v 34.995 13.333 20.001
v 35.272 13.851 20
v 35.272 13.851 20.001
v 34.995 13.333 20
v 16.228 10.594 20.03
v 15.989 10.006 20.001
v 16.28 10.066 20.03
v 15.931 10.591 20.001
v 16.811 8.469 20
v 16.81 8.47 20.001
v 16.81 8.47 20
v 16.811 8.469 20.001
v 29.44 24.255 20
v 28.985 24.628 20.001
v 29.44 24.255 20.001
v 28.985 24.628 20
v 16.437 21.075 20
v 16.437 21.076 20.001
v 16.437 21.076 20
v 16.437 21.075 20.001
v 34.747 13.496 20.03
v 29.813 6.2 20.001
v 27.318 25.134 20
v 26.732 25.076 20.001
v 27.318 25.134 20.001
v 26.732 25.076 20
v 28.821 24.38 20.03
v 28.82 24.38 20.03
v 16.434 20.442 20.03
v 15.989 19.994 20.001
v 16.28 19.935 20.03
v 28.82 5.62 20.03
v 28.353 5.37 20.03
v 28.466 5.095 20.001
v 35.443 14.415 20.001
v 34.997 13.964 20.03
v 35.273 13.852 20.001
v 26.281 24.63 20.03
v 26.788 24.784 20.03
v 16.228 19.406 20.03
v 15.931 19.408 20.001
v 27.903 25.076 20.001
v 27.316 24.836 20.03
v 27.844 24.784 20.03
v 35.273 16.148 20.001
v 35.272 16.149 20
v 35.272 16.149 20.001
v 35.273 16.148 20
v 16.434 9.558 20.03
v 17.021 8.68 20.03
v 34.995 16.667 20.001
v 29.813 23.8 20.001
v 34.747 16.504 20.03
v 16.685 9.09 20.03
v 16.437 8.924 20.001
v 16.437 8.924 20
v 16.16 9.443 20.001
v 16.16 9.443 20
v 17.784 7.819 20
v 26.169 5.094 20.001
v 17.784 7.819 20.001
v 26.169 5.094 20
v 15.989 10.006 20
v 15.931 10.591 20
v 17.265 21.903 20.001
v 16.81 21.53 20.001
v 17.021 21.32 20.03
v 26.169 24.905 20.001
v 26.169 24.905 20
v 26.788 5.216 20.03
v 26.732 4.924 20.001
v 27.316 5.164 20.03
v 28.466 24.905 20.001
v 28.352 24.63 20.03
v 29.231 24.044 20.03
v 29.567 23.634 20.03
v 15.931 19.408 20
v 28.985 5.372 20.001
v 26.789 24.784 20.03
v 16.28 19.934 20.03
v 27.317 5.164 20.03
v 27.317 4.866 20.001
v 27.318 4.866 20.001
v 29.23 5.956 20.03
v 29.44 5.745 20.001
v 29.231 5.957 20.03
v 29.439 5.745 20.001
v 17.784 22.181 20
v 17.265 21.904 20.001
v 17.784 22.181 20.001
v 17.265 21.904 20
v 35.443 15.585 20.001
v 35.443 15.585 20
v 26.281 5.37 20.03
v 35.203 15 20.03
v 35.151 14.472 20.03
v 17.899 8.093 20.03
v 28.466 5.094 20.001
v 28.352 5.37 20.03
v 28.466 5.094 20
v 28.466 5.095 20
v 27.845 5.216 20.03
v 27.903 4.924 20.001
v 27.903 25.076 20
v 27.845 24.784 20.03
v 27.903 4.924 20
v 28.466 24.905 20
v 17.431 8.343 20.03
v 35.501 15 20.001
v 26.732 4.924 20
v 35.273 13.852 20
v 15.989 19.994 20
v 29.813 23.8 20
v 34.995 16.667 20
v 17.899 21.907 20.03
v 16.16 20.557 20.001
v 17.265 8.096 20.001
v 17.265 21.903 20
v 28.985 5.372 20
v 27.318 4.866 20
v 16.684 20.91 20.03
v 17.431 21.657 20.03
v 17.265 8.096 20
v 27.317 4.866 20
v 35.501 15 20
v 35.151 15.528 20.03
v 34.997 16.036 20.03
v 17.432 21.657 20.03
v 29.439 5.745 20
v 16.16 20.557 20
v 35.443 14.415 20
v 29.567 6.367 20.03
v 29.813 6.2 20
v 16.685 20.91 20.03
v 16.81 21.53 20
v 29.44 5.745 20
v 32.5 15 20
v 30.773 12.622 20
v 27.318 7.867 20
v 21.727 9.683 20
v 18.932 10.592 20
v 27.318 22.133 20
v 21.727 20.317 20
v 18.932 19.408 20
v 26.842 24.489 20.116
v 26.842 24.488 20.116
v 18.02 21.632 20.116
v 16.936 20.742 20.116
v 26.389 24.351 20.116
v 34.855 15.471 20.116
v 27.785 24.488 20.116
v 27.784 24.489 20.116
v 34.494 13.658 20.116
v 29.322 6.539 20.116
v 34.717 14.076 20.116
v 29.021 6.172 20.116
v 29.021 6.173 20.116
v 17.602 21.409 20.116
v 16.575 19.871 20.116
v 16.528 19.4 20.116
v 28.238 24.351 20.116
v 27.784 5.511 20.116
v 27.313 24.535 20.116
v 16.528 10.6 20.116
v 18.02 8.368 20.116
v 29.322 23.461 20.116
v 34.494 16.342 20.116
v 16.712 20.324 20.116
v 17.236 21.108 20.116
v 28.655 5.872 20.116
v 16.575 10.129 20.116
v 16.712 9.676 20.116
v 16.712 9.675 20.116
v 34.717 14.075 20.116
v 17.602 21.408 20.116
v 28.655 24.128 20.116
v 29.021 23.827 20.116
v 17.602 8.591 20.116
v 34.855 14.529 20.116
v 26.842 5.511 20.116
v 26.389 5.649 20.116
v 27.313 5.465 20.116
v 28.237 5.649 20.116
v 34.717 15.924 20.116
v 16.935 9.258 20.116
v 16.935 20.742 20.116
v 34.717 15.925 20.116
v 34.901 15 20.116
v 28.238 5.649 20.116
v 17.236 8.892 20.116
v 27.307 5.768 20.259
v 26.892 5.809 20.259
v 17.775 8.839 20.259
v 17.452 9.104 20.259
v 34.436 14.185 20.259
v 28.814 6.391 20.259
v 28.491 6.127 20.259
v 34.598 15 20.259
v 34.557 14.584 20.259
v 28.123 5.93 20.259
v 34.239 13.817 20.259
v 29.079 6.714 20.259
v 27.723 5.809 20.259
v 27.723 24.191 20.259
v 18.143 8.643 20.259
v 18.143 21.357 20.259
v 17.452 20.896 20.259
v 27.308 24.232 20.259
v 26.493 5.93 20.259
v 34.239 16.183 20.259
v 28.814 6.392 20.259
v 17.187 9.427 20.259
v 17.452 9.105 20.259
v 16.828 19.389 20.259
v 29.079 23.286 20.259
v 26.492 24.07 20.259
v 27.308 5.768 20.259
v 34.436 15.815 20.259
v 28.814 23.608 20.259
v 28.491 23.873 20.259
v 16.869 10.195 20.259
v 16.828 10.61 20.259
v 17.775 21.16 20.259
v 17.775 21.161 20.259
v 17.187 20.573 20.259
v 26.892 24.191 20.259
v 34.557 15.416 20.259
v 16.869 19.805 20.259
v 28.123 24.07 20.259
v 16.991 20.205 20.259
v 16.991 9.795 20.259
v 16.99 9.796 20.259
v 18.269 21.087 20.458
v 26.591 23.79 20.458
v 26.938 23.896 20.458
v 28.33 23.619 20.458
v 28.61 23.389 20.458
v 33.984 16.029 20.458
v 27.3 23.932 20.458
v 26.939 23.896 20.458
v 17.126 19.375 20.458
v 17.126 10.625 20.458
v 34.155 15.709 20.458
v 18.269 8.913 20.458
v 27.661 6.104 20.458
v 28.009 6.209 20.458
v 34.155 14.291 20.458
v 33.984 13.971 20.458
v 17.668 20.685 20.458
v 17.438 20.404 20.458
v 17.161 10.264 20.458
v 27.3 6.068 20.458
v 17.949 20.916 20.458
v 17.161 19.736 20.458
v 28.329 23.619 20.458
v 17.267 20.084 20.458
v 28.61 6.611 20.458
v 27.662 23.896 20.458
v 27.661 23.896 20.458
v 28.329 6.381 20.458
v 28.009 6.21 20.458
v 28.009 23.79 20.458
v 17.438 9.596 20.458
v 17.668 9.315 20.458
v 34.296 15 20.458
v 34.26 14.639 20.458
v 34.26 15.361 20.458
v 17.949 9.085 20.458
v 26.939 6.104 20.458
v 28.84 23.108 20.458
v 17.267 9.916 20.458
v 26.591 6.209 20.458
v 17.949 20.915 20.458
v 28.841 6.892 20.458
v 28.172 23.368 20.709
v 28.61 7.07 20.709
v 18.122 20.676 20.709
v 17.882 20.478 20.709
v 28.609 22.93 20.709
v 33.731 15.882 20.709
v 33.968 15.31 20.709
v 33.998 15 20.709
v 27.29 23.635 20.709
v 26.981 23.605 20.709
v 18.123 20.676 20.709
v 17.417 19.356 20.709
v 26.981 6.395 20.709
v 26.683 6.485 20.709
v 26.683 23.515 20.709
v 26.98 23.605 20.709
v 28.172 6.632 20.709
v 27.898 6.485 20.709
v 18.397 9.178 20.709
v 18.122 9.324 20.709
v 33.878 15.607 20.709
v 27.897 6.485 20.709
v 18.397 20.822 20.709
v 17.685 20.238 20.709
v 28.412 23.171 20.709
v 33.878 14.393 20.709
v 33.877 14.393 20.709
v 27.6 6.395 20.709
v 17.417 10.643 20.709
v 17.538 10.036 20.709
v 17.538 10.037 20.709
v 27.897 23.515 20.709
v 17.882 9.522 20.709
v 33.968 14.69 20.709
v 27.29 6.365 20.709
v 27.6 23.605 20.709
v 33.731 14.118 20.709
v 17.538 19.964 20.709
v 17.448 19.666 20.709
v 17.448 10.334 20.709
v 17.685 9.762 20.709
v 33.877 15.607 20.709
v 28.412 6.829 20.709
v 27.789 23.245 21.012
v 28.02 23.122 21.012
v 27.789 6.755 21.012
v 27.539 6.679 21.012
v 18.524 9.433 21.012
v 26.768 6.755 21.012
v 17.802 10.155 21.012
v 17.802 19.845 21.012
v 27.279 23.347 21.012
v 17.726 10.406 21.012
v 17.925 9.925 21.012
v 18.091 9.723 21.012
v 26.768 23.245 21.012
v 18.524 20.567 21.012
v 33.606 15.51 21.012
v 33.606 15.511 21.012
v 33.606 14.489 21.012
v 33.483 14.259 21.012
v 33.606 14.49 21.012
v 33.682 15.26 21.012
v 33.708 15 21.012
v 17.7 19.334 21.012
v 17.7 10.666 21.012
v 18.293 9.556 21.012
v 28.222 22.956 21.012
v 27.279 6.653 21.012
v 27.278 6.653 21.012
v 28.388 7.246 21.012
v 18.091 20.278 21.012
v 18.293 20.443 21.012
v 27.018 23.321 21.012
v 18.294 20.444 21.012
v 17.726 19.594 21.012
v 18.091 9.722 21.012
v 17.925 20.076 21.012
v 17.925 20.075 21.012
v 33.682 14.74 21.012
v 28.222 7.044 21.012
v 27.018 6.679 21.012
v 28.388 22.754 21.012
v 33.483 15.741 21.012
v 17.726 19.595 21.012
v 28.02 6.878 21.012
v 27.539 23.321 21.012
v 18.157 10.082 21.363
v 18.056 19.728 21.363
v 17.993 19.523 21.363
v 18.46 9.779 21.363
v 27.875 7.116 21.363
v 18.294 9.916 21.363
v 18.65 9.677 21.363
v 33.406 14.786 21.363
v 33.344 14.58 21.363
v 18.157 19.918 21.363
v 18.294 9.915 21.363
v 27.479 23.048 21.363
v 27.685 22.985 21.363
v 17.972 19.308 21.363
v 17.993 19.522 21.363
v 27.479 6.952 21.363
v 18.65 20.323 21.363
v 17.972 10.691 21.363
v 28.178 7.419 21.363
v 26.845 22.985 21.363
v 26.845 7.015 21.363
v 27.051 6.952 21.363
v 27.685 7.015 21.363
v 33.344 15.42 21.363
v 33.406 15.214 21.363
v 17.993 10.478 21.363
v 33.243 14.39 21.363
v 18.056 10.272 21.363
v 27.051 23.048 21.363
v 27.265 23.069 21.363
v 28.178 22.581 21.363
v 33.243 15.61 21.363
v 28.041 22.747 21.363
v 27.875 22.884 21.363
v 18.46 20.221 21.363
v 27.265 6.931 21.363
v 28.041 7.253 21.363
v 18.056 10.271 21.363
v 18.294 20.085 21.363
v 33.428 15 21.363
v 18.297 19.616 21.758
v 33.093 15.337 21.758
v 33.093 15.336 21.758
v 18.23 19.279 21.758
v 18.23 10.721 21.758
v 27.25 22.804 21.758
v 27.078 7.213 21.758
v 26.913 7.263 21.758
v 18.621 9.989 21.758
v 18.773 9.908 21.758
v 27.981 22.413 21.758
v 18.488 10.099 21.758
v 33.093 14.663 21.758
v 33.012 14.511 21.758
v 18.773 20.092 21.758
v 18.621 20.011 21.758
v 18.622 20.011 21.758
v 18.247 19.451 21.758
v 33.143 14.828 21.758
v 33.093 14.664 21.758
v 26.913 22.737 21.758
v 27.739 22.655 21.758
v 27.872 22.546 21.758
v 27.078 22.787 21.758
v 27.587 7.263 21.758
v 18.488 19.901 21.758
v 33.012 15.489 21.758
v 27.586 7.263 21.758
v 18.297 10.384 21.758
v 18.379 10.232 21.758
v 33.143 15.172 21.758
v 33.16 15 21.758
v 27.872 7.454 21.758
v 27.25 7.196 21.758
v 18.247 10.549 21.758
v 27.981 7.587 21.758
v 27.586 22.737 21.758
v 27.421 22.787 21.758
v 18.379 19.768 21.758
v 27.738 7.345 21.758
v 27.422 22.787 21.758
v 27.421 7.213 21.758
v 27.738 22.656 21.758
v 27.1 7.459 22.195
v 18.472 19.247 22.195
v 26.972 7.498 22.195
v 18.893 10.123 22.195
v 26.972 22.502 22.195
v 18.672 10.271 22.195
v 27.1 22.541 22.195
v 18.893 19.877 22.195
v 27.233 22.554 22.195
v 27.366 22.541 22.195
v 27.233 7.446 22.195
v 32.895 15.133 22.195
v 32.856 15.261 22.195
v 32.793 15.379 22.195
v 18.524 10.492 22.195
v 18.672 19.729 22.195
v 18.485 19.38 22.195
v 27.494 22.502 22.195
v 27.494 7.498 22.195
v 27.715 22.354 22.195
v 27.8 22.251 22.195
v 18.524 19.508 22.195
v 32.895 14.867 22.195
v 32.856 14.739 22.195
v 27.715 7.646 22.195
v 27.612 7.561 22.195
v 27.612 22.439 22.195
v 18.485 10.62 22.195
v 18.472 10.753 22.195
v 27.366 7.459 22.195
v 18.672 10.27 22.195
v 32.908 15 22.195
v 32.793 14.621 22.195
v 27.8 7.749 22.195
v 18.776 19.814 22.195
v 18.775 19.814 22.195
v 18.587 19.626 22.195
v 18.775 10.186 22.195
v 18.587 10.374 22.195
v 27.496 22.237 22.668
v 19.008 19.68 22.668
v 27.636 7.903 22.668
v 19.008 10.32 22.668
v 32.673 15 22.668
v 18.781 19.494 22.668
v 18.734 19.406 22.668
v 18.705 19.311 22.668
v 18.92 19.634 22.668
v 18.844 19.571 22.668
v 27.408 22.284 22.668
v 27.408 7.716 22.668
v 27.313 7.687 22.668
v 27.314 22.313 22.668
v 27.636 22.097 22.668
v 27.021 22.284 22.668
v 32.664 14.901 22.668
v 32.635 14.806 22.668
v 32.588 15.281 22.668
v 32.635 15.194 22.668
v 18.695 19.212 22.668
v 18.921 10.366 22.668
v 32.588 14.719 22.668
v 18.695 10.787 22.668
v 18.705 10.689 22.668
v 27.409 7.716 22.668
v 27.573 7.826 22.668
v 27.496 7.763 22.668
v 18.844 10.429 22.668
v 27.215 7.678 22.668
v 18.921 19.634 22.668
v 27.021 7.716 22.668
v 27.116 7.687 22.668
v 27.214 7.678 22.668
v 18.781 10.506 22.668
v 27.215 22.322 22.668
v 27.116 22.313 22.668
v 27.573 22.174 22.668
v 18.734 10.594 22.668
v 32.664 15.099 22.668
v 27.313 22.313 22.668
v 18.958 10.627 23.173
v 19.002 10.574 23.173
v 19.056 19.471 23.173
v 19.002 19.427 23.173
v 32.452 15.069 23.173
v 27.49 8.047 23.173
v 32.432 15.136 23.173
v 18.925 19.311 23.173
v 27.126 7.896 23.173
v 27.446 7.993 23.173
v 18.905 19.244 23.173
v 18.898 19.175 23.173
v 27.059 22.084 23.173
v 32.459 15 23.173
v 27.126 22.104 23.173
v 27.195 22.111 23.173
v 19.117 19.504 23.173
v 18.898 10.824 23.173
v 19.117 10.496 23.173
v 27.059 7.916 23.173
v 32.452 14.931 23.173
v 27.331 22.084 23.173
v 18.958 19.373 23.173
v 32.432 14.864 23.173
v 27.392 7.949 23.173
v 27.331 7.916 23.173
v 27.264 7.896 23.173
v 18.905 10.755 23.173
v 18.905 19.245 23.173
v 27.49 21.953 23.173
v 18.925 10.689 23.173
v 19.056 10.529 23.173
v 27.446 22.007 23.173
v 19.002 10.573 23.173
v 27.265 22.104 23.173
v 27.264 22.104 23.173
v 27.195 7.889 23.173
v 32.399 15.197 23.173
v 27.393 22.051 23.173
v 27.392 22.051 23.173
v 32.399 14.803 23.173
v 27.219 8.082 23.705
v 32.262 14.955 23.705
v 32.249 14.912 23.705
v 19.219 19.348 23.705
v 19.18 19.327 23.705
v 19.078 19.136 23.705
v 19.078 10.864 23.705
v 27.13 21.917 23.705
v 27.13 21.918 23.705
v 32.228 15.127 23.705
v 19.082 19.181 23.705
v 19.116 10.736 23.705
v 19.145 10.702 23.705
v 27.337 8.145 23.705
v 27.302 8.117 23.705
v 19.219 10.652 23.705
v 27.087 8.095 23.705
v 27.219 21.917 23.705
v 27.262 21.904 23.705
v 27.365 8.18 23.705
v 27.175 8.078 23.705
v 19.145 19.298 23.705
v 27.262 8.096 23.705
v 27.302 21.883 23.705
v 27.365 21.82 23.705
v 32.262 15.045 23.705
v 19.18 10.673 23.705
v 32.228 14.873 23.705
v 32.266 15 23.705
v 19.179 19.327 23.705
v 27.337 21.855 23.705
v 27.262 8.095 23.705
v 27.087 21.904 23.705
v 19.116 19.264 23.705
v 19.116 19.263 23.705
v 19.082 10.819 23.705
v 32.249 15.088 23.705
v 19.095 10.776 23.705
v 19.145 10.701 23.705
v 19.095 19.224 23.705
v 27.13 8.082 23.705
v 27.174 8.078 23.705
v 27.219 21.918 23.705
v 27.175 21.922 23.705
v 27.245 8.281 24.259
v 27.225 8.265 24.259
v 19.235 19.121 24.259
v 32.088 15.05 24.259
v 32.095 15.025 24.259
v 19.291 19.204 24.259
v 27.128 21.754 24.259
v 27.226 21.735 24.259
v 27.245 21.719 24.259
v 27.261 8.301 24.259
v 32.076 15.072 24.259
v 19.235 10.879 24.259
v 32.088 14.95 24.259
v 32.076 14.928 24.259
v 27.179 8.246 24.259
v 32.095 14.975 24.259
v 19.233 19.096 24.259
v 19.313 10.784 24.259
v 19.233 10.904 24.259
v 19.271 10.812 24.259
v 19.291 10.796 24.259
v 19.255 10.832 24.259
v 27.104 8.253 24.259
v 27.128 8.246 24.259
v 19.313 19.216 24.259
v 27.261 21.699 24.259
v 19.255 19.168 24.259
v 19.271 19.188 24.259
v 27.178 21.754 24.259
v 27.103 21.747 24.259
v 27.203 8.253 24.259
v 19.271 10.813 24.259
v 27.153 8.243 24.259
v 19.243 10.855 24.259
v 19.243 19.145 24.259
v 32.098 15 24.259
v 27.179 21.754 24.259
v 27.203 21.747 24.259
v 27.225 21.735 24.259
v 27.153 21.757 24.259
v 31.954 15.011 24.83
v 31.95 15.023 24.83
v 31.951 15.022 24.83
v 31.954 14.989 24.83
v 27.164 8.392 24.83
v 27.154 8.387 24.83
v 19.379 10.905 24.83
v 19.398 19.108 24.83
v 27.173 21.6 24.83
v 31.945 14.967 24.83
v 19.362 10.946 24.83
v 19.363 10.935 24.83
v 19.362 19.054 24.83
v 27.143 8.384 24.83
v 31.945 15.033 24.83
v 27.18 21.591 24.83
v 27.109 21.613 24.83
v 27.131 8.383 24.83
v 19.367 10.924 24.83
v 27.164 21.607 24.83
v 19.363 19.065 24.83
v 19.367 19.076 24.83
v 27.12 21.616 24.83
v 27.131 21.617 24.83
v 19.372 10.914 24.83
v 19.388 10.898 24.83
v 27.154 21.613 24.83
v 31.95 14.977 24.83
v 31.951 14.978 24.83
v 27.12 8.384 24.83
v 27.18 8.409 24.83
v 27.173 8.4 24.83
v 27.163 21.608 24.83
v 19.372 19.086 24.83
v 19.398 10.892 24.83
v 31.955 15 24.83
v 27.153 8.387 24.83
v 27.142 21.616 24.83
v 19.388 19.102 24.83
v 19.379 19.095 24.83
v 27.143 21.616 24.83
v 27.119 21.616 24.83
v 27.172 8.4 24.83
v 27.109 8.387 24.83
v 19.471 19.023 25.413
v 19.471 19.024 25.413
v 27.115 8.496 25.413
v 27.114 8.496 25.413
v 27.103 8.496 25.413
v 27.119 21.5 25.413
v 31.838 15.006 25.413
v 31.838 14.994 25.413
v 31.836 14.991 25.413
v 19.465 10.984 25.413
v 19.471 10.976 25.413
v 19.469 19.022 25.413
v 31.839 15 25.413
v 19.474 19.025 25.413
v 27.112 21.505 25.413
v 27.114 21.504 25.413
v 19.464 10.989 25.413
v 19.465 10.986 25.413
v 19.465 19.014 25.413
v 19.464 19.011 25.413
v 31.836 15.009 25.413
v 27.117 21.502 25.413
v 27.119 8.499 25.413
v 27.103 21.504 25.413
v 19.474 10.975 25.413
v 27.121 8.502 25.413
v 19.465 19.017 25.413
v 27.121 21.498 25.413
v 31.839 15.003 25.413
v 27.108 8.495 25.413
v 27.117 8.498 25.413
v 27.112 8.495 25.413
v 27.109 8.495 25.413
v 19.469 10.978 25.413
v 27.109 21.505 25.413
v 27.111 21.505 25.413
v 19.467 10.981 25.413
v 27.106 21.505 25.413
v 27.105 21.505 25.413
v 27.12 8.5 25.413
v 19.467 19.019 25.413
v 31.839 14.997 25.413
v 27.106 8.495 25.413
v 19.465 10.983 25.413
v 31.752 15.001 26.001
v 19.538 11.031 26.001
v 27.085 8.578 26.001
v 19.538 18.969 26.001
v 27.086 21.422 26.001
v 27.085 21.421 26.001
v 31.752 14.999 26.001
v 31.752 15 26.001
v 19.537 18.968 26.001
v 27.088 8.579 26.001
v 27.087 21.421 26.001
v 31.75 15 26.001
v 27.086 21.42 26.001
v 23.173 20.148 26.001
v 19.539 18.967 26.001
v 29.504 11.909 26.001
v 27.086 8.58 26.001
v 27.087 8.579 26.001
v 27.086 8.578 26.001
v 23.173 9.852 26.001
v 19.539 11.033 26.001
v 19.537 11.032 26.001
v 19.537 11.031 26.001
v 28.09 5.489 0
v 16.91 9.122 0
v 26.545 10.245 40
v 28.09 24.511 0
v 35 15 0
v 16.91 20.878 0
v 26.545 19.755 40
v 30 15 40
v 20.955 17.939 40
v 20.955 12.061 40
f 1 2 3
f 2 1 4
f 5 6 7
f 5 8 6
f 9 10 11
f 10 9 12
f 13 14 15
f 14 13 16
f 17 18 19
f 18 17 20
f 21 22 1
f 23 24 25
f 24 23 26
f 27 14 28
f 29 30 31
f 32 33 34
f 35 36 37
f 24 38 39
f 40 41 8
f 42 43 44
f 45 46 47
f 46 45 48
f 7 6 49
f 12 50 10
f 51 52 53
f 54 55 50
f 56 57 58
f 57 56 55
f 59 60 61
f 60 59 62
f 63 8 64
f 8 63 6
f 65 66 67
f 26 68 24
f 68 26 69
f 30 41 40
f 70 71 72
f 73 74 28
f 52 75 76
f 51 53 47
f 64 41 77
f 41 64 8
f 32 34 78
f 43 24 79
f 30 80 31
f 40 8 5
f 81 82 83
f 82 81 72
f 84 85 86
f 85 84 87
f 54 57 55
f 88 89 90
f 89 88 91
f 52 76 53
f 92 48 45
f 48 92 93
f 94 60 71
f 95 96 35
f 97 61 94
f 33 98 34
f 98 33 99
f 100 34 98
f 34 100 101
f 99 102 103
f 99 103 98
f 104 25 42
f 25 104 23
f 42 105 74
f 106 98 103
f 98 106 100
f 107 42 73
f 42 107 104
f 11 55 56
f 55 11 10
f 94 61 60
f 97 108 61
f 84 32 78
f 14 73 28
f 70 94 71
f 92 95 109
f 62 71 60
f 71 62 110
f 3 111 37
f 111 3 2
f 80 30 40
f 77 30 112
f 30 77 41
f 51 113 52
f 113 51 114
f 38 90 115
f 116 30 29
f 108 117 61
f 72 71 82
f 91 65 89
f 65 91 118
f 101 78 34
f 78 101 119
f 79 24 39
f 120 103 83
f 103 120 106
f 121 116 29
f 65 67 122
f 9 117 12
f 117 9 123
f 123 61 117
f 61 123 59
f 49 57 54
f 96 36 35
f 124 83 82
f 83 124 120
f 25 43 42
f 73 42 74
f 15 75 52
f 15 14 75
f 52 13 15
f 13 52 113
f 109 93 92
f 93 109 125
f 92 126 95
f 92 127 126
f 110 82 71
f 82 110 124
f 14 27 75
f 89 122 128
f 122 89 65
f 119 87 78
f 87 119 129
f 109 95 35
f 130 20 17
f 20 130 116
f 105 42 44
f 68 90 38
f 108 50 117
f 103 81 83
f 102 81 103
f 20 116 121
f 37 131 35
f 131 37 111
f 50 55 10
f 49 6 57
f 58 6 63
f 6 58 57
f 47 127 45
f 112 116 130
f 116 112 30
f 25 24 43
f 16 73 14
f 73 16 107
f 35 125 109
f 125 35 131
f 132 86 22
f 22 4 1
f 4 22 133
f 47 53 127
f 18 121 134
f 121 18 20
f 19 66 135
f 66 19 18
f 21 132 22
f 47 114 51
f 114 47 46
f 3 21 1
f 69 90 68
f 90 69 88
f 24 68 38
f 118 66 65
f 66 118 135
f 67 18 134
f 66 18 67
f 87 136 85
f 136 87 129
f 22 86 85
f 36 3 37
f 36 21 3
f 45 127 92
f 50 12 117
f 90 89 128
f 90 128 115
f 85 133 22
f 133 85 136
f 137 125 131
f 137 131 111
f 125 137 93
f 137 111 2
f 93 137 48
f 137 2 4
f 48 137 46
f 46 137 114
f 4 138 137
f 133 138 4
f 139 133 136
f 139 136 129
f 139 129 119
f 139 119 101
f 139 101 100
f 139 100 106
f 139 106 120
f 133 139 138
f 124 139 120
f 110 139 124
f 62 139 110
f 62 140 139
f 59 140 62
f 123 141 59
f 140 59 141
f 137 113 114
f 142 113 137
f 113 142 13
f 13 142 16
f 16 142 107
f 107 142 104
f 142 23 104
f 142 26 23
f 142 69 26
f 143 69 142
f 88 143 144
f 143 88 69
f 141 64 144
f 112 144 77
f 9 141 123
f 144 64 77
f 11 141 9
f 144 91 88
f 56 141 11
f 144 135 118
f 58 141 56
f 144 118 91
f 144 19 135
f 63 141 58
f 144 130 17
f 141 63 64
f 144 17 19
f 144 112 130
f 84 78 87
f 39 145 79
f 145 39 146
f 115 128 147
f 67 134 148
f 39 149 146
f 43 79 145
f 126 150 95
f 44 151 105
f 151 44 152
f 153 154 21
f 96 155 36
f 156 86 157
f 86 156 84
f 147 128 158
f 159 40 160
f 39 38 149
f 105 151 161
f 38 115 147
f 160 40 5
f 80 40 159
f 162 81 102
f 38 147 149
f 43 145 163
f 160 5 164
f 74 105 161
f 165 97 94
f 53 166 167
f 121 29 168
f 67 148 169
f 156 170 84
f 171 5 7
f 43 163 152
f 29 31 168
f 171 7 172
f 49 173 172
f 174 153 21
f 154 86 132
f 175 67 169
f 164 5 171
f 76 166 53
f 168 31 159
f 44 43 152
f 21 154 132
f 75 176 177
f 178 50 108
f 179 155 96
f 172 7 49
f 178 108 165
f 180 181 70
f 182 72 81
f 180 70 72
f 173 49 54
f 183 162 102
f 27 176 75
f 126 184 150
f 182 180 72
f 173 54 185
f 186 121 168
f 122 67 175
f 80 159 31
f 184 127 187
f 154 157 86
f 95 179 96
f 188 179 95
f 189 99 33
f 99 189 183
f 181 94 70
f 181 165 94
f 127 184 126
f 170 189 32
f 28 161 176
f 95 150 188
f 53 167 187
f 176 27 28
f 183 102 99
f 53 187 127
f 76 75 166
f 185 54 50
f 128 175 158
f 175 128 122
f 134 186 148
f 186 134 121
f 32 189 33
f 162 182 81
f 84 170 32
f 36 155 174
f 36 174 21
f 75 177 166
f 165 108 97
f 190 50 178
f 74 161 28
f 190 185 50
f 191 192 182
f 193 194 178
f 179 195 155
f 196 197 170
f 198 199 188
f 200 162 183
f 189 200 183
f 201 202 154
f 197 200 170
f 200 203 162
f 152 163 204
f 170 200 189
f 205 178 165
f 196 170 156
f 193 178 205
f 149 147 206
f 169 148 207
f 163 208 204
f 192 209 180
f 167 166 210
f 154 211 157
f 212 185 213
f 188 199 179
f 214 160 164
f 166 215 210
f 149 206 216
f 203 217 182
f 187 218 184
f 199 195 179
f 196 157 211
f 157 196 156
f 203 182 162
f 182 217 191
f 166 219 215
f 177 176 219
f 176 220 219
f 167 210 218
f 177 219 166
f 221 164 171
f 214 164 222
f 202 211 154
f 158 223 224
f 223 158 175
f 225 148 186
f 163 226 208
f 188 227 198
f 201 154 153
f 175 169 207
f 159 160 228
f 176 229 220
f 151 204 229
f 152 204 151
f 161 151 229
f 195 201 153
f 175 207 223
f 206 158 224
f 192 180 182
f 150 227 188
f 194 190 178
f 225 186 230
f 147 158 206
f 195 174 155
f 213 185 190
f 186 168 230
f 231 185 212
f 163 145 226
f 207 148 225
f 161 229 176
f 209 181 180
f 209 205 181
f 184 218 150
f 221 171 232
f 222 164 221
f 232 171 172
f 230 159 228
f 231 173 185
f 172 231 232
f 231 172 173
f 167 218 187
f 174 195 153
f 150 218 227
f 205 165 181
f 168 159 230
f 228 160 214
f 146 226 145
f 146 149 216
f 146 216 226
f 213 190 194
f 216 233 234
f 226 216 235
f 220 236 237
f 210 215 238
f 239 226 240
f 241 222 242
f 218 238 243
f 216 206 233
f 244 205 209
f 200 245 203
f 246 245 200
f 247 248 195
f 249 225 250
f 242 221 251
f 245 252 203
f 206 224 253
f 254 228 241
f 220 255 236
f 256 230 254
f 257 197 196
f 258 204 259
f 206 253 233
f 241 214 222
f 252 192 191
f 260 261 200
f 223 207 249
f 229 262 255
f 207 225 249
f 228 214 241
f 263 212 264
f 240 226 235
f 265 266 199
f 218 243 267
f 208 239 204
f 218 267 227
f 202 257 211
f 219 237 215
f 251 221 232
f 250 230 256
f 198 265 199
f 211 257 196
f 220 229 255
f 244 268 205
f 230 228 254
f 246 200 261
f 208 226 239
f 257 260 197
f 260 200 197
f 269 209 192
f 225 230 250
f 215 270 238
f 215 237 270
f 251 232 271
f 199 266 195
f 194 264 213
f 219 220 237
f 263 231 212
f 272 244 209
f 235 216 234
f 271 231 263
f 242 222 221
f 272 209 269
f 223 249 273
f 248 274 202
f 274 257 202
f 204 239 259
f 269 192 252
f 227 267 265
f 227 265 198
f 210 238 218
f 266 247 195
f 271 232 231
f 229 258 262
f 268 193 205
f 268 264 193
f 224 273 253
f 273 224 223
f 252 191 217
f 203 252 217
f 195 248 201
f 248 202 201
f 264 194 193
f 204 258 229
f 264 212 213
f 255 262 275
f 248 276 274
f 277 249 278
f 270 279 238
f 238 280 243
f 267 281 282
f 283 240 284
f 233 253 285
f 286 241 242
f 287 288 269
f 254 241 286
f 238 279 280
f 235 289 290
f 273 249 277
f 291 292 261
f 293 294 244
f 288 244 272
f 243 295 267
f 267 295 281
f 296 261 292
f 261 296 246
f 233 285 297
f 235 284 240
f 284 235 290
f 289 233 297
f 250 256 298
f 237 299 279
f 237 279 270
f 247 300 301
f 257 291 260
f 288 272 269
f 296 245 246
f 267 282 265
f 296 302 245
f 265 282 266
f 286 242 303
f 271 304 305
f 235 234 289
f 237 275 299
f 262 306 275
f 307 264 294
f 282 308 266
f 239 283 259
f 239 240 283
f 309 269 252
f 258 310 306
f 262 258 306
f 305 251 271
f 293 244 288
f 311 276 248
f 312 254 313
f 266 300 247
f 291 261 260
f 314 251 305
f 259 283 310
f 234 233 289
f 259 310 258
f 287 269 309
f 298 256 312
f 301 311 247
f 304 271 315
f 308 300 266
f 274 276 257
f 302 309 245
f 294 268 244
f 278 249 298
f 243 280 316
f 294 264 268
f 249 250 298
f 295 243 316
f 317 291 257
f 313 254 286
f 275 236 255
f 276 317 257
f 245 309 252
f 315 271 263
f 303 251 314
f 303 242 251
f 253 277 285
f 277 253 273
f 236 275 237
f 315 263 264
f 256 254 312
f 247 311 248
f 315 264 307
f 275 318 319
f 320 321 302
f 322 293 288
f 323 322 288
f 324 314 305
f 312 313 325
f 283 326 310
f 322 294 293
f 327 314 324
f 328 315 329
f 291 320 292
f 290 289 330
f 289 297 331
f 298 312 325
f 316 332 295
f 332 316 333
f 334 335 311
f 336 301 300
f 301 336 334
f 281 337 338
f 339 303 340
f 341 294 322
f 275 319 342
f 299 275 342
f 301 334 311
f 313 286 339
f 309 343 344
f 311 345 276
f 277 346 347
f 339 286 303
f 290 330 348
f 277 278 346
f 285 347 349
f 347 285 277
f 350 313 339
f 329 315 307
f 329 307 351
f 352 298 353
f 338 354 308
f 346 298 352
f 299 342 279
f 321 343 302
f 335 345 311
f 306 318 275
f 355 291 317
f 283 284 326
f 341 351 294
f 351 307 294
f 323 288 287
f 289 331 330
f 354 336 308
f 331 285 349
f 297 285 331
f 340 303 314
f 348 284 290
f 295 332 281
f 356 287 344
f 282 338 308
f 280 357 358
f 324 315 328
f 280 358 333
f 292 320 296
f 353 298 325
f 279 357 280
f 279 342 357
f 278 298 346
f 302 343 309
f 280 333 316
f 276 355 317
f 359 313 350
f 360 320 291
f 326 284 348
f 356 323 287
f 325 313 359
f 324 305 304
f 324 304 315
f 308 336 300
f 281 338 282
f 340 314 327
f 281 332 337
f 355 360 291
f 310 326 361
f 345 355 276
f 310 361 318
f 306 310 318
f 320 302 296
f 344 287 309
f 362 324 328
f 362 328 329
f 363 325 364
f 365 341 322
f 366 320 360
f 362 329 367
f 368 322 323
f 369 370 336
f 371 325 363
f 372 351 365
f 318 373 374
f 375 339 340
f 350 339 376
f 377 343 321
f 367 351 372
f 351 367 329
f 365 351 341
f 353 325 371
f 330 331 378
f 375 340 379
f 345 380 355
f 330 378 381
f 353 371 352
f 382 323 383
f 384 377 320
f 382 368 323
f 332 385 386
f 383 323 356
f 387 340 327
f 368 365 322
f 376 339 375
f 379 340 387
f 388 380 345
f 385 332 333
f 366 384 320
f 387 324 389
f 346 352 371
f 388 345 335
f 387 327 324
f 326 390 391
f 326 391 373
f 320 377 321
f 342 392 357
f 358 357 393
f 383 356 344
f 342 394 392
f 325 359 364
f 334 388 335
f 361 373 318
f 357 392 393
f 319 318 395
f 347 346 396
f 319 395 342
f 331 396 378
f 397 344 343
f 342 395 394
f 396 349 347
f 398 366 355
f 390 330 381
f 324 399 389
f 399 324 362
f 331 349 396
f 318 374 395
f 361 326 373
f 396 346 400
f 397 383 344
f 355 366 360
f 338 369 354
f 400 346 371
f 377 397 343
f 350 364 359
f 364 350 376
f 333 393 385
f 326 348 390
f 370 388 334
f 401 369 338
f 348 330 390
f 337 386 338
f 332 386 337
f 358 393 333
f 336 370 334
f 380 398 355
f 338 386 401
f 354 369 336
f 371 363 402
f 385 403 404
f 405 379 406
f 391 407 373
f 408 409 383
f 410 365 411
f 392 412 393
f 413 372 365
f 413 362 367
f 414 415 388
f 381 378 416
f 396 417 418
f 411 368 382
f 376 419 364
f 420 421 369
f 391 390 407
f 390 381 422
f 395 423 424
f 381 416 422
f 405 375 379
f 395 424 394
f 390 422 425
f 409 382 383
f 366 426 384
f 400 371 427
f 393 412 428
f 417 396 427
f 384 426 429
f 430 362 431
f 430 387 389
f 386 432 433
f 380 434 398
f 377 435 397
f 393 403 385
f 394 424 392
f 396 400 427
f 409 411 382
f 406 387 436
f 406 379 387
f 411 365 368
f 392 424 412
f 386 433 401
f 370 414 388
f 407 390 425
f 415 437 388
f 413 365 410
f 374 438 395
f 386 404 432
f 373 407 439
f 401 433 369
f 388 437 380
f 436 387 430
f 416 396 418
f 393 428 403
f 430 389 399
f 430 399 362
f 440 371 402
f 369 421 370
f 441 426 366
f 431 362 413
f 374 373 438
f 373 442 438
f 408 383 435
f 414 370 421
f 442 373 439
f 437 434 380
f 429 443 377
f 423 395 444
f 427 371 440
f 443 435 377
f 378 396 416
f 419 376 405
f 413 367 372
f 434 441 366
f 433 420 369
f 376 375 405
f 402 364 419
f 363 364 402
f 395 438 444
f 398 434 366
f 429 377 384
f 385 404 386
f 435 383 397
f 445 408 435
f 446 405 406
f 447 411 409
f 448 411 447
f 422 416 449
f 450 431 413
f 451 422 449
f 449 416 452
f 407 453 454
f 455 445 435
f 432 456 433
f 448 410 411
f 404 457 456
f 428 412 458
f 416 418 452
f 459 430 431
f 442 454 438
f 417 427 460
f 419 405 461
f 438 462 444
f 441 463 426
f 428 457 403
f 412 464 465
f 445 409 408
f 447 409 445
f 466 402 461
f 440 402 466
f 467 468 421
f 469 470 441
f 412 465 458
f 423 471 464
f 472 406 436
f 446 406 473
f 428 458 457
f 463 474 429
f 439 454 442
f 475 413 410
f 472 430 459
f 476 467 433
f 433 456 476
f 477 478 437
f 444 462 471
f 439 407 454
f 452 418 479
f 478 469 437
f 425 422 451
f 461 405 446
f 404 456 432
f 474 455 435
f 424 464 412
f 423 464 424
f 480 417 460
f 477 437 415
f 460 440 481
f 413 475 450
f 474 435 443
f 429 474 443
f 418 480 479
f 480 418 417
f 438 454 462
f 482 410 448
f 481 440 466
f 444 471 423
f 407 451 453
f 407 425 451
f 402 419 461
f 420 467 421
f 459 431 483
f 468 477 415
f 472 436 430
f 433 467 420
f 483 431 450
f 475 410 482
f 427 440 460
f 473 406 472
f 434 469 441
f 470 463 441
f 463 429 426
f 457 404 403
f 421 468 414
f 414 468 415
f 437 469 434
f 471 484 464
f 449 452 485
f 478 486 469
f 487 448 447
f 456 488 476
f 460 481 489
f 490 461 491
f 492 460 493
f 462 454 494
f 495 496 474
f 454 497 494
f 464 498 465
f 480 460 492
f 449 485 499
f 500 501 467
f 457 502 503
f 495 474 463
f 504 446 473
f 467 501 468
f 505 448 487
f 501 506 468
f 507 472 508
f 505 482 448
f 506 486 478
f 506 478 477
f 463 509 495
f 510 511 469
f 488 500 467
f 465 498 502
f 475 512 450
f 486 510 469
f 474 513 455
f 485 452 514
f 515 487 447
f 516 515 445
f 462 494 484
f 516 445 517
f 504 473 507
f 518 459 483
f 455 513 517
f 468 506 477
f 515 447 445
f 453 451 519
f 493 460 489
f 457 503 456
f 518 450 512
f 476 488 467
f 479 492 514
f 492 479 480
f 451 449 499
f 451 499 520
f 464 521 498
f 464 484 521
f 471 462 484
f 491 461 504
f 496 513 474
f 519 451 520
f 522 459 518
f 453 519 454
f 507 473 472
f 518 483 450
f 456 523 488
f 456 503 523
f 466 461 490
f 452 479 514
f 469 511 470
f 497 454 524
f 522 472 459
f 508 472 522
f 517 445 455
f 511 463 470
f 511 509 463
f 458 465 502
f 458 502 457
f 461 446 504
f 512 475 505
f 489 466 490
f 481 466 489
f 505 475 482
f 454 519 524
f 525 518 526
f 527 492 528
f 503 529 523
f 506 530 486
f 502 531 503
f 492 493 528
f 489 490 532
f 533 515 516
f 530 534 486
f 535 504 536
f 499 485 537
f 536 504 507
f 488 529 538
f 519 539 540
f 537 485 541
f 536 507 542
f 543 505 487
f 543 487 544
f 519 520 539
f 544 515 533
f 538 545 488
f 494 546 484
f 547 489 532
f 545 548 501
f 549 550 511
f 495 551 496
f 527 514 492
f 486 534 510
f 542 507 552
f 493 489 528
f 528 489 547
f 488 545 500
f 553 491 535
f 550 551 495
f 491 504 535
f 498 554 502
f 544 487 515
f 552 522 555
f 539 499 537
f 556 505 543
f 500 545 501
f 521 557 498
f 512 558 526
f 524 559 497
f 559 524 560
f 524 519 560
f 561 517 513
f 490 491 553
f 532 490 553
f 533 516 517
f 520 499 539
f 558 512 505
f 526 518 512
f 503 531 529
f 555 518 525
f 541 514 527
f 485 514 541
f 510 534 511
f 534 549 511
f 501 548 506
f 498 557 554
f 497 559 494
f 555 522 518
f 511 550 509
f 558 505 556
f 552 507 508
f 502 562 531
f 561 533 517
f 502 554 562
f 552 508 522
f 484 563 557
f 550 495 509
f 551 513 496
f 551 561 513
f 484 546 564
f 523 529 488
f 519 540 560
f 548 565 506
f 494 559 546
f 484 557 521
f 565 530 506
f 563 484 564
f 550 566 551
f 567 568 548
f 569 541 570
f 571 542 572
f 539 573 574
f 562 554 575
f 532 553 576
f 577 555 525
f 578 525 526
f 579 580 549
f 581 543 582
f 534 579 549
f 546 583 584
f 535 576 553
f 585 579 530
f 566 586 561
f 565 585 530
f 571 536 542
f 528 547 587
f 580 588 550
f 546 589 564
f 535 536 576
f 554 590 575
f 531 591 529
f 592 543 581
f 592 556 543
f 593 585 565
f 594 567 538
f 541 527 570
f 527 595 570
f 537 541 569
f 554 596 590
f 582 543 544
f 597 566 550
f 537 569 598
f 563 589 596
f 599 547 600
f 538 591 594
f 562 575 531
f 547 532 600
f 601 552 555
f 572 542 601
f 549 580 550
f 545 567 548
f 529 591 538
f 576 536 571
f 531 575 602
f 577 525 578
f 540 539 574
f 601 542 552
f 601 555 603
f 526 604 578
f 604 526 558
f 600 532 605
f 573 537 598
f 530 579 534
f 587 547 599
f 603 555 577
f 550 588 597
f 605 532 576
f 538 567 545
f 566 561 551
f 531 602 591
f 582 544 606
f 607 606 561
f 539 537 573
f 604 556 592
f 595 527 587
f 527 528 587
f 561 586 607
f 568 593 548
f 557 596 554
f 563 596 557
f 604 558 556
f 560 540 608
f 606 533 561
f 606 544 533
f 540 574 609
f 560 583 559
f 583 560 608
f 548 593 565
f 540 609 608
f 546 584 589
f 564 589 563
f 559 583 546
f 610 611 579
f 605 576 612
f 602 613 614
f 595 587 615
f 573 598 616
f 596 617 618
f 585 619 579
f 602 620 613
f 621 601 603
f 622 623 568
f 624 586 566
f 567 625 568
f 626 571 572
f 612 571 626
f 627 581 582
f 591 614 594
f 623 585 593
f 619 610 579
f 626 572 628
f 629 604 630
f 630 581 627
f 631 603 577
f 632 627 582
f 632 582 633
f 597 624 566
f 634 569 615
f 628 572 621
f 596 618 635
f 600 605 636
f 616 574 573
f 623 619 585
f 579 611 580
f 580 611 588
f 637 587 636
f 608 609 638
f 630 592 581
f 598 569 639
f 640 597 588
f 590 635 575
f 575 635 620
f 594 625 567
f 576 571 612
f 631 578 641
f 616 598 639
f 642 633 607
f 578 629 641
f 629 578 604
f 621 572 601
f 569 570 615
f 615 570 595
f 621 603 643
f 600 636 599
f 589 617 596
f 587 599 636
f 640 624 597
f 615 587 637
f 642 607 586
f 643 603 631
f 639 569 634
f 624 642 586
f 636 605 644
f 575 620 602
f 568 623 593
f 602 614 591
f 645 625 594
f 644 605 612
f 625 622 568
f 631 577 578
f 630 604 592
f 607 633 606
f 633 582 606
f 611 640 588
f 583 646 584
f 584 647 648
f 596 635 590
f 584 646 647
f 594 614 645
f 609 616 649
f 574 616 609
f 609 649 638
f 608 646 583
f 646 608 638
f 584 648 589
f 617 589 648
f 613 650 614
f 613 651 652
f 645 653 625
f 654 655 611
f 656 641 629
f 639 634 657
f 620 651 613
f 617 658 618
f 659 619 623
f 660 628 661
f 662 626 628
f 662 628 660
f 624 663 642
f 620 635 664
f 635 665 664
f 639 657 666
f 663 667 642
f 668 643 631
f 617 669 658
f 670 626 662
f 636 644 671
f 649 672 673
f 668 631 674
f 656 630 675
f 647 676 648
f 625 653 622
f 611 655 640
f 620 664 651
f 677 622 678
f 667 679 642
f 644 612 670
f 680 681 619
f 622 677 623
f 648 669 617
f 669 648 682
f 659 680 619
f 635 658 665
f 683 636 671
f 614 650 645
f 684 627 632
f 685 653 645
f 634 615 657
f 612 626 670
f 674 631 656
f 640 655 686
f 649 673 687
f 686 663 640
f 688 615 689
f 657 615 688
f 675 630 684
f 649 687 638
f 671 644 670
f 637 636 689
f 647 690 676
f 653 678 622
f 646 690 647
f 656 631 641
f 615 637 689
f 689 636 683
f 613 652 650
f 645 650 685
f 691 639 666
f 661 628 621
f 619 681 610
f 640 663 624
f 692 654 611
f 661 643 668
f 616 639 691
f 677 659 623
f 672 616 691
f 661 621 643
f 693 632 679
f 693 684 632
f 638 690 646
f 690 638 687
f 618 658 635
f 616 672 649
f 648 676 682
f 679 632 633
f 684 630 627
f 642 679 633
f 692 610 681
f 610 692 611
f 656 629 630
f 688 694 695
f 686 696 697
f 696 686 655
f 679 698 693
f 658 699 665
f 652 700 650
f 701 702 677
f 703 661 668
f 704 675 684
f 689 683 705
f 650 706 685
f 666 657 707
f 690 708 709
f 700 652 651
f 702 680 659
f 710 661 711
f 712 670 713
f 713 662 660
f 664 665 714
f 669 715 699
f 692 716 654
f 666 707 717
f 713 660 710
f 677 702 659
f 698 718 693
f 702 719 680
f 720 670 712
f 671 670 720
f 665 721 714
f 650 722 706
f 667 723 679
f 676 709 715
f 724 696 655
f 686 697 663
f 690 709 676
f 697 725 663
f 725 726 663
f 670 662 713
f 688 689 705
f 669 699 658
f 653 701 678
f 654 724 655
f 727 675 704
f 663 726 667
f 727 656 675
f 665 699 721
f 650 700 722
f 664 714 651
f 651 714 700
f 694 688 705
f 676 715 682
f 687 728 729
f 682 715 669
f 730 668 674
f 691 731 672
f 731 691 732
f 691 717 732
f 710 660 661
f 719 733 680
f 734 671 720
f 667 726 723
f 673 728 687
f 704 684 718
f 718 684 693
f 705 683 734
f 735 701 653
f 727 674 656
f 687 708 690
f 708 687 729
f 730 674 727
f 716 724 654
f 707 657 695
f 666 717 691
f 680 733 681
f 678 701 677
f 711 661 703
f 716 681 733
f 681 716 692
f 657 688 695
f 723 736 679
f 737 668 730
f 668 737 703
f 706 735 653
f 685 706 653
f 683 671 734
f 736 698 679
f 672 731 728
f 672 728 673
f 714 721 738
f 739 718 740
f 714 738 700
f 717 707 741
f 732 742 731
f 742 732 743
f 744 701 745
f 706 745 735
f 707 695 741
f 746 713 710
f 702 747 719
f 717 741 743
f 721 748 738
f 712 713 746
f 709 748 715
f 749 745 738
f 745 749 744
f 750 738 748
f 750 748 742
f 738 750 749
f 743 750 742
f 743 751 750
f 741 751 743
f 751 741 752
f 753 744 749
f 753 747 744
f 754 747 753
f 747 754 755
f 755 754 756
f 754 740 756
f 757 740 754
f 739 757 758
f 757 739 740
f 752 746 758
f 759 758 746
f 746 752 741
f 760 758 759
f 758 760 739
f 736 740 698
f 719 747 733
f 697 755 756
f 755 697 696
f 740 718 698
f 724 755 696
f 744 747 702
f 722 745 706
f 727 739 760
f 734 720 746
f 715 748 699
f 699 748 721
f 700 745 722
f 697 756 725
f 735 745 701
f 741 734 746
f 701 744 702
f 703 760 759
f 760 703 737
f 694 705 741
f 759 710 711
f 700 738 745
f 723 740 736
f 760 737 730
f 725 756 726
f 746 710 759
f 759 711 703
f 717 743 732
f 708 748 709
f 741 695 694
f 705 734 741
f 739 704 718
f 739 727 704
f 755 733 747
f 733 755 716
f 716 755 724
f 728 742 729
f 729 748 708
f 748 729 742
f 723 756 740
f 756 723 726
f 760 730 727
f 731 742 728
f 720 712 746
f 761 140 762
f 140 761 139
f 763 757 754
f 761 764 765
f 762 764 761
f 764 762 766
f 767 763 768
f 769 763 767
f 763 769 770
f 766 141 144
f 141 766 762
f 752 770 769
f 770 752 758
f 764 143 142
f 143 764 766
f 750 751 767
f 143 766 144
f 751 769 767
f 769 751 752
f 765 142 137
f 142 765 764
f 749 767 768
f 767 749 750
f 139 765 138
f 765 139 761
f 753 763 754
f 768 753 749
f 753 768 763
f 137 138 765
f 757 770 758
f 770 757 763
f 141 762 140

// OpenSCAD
// file: naca4.scad
// Naca4.scad - library for parametric airfoils of 4 digit NACA series
// Code: Rudolf Huttary, Berlin 
// June 2015
// commercial use prohibited


// general use: for more examples refer to sampler.scad
// naca = naca digits or 3el vector  (default = 12 or [0, 0, .12])
// L    = chord length [mm]      (default= 100)
// N    = # sample points        (default= 81)
// h    = height [mm]            (default= 1)
// open = close at the thin end? (default = true)
// two equivalent example calls
 airfoil(naca = 2408, L = 60, N=1001, h = 30, open = false); 
// airfoil(naca = [.2, .4, .32], L = 60, N=1001, h = 30, open = false); 

module help()
{
  echo(str("\n\nList of signatures in lib:\n=================\n", 
  "module airfoil(naca=2412, L = 100, N = 81, h = 1, open = false) - renders airfoil object\n", 
  "module airfoil(naca=[.2, .4, .12], L = 100, N = 81, h = 1, open = false) - renders airfoil object using percentage for camber,  camber distance and thicknes\n", 
  "function airfoil_data(naca=12, L = 100, N = 81, open = false)\n",
  "=================\n")); 
}

help(); 
// this is the object
module airfoil(naca=12, L = 100, N = 81, h = 1, open = false)
{
  linear_extrude(height = h)
  polygon(points = airfoil_data(naca, L, N, open)); 
}

// this is the main function providing the airfoil data
function airfoil_data(naca=12, L = 100, N = 81, open = false) = 
  let(Na = len(naca)!=3?NACA(naca):naca)
  let(A = [.2969, -0.126, -.3516, .2843, open?-0.1015:-0.1036])
  [for (b=[-180:360/(N):179.99]) 
    let (x = (1-cos(b))/2)  
    let(yt = sign(b)*Na[2]/.2*(A*[sqrt(x), x, x*x, x*x*x, x*x*x*x])) 
    Na[0]==0?L*[x, yt]:L*camber(x, yt, Na[0], Na[1], sign(b))];  


function trailing_edge_angle(naca=12, open = false) = 
  let(Na = len(naca)!=3?NACA(naca):naca)
  let(A = [.2969, -0.126, -.3516, .2843, open?-0.1015:-0.1036])
  let (x =0.999)  // set x near to airfoil trailing edge
  let(yt = Na[2]/.2*(A*[sqrt(x), x, x*x, x*x*x, x*x*x*x])) // calculate distance from x-axis at previously set position
  atan2(yt,1-x);  // calculate angle of triangle between end of airfoil. The triange height corresponds to previously calculated distance from x-axis

// helper functions
function NACA(naca) = 
  let (M = floor(naca/1000))
  let (P = floor((naca-M*1000)/100)) 
  [M/100, P/10, floor(naca-M*1000-P*100)/100];  

function camber(x, y, M, P, upper) = 
  let(yc = (x<P)?M/P/P*(2*P*x-x*x): M/(1-P)/(1-P)*(1 - 2*P + 2*P*x -x*x))
  let(dy = (x<P)?2*M/P/P*(P-x):2*M/(1-P)/(1-P)*(P-x))
  let(th = atan(dy))
  [upper ? x - y*sin(th):x + y*sin(th), upper ? yc + y*cos(th):yc - y*cos(th)];
// main file
h=20;

h_bevel=6;
r_bevel=3;

function h_bev(i)=h_bevel*(1-cos(90*i));
function r_bev(i)=((i==1)?e:0)+r_bevel*(1-sin(90*i));


e=0.001;

fn_bevel=16 ;
$fn=32;

module part_base(){
	cube([60,30,20]);
}

module part1(){
	translate([25,15,20])
		rotate([0,0,0])
			cylinder(40,10,5,true,$fn=5);
}

module part2(){
	translate([25,15,20])
		difference(){
		rotate([90,0,0])
			rotate_extrude()translate([10,0,0])circle(5);
		rotate([0,45,0])translate([100,0,0])cube(200,true);
		}
}

module part3(){
	translate([25,15,20])
		rotate([0,135,0])
			translate([-10,0,0])
			linear_extrude(height=15+e,scale=[1,e])circle(5);
}


module part4(){
	translate([25,15,0])
			translate([-10,0,0])
			cube([10,10,100]);
			/*union(){
				airfoil(naca = 0015, L = 20, N = 100, h = 50, open = false);
			}*/
}

module slice(h){
	projection(cut=true)
		translate([0,0,-h])
			children(0);
}

module edge(){
	difference(){
		minkowski(){
			children(0);
			circle(e);
		}
		children(0);
	}
}

module bev(i){
	minkowski(){
		children(0);
		circle(r_bev(i));
	}
}

module extrude(){
	linear_extrude(height=e)children(0);
}

module bevel(h,h_bevel,r_bevel,fn_bevel){
	translate([0,0,h])
		for(i=[0:1/fn_bevel:1-1/fn_bevel]){
			hull(){
				translate([0,0,h_bev(i)])
					extrude()bev(i)edge()slice(h+h_bev(i))children(0);
				translate([0,0,h_bev(i+1/fn_bevel)])
					extrude()bev(i+1/fn_bevel)edge()slice(h+h_bev(i+1/fn_bevel))children(0);
			}
		}
}


use <./naca4.scad>

//bevel(10,10,10,20)airfoil(naca = 0015, L = 100, N = 100, h = 50, open = false);



//bevel(h,h_bevel,r_bevel,fn_bevel)part2();
//bevel(h,h_bevel,r_bevel,fn_bevel)part3();
part1();
//part1();
bevel(h,h_bevel,r_bevel,fn_bevel)part1();
//part4();
//part1();
//part_base();
